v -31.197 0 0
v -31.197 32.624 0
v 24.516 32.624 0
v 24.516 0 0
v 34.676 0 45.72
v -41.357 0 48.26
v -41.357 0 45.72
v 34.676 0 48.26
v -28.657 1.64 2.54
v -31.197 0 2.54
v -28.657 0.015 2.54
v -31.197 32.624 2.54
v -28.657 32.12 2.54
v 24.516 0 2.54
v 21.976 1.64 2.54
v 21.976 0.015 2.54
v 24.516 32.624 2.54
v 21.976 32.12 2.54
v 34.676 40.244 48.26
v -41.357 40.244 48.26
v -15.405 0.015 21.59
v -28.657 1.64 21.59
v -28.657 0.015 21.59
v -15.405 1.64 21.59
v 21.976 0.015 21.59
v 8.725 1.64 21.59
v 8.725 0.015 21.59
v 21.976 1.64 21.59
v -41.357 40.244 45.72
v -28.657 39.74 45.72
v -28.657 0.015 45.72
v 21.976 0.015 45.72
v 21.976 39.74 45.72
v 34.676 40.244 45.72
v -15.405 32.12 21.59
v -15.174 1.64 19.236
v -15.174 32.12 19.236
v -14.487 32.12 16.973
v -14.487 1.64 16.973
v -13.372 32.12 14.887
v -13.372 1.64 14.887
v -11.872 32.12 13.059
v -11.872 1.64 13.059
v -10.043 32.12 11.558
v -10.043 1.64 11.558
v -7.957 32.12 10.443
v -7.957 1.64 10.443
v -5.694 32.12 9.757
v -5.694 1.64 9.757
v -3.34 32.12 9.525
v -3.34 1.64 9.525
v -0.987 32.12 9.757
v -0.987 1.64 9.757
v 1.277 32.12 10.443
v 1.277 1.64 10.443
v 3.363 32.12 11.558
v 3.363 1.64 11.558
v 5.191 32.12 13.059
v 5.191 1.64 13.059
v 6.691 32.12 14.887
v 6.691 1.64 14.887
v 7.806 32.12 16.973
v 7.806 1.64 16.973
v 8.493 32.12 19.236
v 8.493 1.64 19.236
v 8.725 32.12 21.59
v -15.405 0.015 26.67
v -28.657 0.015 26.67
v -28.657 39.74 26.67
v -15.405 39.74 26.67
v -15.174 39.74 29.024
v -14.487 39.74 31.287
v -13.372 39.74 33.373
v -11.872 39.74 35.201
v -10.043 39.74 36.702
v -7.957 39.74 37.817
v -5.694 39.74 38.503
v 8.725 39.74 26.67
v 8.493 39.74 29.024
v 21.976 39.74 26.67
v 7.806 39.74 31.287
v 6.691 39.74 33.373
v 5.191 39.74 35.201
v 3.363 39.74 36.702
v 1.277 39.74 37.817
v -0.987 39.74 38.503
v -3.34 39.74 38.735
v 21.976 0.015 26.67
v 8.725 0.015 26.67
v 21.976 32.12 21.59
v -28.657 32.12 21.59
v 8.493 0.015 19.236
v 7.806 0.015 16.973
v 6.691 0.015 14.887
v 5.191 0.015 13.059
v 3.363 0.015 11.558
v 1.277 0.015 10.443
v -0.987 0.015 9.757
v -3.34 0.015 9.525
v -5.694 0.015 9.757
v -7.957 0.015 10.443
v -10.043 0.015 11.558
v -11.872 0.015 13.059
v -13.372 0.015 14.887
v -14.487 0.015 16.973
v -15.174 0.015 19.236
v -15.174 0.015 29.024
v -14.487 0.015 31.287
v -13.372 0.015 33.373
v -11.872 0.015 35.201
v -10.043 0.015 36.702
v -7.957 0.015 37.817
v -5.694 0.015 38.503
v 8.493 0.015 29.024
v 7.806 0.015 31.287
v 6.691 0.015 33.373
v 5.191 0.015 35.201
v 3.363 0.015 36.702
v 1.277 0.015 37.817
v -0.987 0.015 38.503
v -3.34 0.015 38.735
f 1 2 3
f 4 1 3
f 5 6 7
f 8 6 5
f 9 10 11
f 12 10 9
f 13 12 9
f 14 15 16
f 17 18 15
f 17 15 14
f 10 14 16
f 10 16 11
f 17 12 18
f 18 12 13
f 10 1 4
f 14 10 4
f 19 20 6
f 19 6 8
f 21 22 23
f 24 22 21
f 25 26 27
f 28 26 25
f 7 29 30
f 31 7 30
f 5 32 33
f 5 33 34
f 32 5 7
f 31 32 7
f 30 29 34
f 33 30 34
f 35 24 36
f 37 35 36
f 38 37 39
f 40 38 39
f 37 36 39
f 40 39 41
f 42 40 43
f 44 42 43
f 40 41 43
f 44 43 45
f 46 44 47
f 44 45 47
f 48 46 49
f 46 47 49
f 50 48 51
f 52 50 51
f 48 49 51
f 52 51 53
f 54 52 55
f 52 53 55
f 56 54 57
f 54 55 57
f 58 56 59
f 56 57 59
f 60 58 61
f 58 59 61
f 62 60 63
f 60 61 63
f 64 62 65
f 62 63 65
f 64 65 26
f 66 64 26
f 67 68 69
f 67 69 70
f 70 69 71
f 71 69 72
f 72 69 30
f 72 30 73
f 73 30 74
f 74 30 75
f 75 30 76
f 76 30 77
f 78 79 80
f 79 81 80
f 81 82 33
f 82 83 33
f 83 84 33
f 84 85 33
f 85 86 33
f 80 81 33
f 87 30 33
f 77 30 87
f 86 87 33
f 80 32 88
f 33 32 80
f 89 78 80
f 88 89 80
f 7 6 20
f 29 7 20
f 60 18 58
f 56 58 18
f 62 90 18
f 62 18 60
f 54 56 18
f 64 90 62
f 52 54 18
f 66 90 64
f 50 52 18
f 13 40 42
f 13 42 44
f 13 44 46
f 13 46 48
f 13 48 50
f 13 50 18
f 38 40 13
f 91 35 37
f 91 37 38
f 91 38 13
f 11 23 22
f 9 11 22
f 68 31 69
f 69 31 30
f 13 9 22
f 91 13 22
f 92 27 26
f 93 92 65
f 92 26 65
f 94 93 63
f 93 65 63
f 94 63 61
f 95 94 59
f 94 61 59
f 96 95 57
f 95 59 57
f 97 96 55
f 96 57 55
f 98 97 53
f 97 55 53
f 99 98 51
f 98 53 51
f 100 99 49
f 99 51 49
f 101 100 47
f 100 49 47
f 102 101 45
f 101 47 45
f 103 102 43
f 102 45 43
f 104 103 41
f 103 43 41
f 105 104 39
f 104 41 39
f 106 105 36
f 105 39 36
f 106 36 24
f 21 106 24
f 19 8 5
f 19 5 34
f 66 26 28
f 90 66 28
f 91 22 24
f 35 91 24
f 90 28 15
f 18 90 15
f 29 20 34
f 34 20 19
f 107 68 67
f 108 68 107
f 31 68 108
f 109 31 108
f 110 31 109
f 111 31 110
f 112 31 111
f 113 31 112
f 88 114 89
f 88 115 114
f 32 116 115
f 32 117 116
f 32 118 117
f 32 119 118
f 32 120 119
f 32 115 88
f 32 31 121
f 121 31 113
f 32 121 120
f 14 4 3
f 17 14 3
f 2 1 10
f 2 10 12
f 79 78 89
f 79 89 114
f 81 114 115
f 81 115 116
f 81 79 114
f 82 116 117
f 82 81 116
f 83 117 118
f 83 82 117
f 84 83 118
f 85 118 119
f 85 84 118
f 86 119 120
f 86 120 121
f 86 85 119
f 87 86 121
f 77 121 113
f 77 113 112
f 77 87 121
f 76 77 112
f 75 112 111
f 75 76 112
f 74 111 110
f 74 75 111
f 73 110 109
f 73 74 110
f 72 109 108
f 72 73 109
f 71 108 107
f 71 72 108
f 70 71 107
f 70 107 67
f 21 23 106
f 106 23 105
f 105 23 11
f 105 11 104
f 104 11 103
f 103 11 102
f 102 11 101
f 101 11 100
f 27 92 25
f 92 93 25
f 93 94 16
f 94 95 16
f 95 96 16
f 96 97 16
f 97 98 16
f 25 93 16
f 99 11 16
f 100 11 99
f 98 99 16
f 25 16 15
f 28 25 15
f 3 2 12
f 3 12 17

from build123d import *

# Parameters (mm, degrees)
F0_W       = 76.0333575308
F0_H       = 40.2435958385
F1_DEPTH   = 2.54
F2_W       = 50.6333575308
F2_H       = 39.7249350895
F3_DEPTH   = 19.05
F4_R       = 12.065
F5_DEPTH   = 50.8
F1_FACE1_W = 76.0333575308
F1_FACE1_H = 2.54
F8_DEPTH   = 38.1
F9_DEPTH   = 30.48
F10_DEPTH  = 7.62
F11_DEPTH  = 7.62
F12_DEPTH  = 10.16
F13_DEPTH  = 10.16
F14_DEPTH  = 10.16
F15_DEPTH  = 10.16


with BuildPart() as f1:
    # F0 (on Top) → F1 (new body)
    with BuildSketch(Plane.XY):
        with Locations((-3.3403802663, 20.1217979193)):
            Rectangle(F0_W, F0_H)
    extrude(amount=F1_DEPTH)

    # F2 (on face) → F3 (join)
    with BuildSketch(Plane.XY.offset(2.54)):
        with Locations((-3.3403802663, 19.8778254271)):
            Rectangle(F2_W, F2_H)
    extrude(amount=F3_DEPTH)

    # F4 (on face) → F5 (cut)
    with BuildSketch(Plane(origin=(0, 39.7402929718, 0), x_dir=(-1, 0, 0), z_dir=(0, 1, 0))):
        with Locations((3.3403802663, 21.59)):
            Circle(F4_R)
    extrude(amount=-F5_DEPTH, mode=Mode.SUBTRACT)


with BuildPart() as f7_1:
    # F7: instance of F1
    add(f1.part.mirror(Plane.XY.offset(24.13)))


with BuildPart() as f1_1:
    add(f1.part)

    # F1_face1 (on face) + F7_face (on face) + F7_face1 (on face) → F8 (cut)
    with BuildSketch(Plane(origin=(-3.3403802663, 0, 1.27), x_dir=(1, 0, 0), z_dir=(0, -1, 0))):
        Rectangle(F1_FACE1_W, F1_FACE1_H)
    with BuildSketch(Plane(origin=(-3.3403802663, 39.7402929718, 10.6965157334), x_dir=(-1, 0, 0), z_dir=(0, 1, 0))):
        with BuildLine():
            Line((-25.3166787654, -8.1565157334), (25.3166787654, -8.1565157334))
            Line((25.3166787654, -8.1565157334), (25.3166787654, 10.8934842666))
            Line((25.3166787654, 10.8934842666), (12.065, 10.8934842666))
            ThreePointArc((12.065, 10.8934842666), (0, -1.1715157334), (-12.065, 10.8934842666))
            Line((-12.065, 10.8934842666), (-25.3166787654, 10.8934842666))
            Line((-25.3166787654, 10.8934842666), (-25.3166787654, -8.1565157334))
        make_face()
    with BuildSketch(Plane(origin=(-3.3403802663, 39.7402929718, 37.5634842666), x_dir=(-1, 0, 0), z_dir=(0, 1, 0))):
        with BuildLine():
            Line((25.3166787654, 8.1565157334), (-25.3166787654, 8.1565157334))
            Line((-25.3166787654, 8.1565157334), (-25.3166787654, -10.8934842666))
            Line((-25.3166787654, -10.8934842666), (-12.065, -10.8934842666))
            ThreePointArc((-12.065, -10.8934842666), (0, 1.1715157334), (12.065, -10.8934842666))
            Line((12.065, -10.8934842666), (25.3166787654, -10.8934842666))
            Line((25.3166787654, -10.8934842666), (25.3166787654, 8.1565157334))
        make_face()
    extrude(amount=F8_DEPTH, dir=(0, -1, 0), mode=Mode.SUBTRACT)

    # F9 (add): a face of the model
    f9_faces = [f1_1.faces().sort_by_distance(p)[0] for p in [
        (15.3504591164, 1.6402929718, 21.0490157678),
    ]]
    extrude(f9_faces, amount=F9_DEPTH)

    # F10 (cut): a face of the model
    f10_faces = [f7_1.part.faces().sort_by_distance(p)[0] for p in [
        (-3.3403802663, 40.2435958385, 46.99),
    ]]
    extrude(f10_faces, amount=F10_DEPTH, mode=Mode.SUBTRACT)

    # F11 (cut): a face of the model
    f11_faces = [f1_1.faces().sort_by_distance(p)[0] for p in [
        (-3.3403802663, 40.2435958385, 1.27),
    ]]
    extrude(f11_faces, amount=-F11_DEPTH, mode=Mode.SUBTRACT)

    # F12 (cut): a face of the model
    f12_faces = [f1_1.faces().sort_by_distance(p)[0] for p in [
        (-41.3570590317, 16.3117979193, 1.27),
    ]]
    extrude(f12_faces, amount=-F12_DEPTH, mode=Mode.SUBTRACT)

    # F13 (cut): a face of the model
    f13_faces = [f1_1.faces().sort_by_distance(p)[0] for p in [
        (34.6762984991, 16.3117979193, 1.27),
    ]]
    extrude(f13_faces, amount=-F13_DEPTH, mode=Mode.SUBTRACT)

    # F14 (cut): a face of the model
    f14_faces = [f7_1.part.faces().sort_by_distance(p)[0] for p in [
        (34.6762984991, 20.1217979193, 46.99),
    ]]
    extrude(f14_faces, amount=F14_DEPTH, mode=Mode.SUBTRACT)

    # F15 (cut): a face of the model
    f15_faces = [f7_1.part.faces().sort_by_distance(p)[0] for p in [
        (-41.3570590317, 20.1217979193, 46.99),
    ]]
    extrude(f15_faces, amount=F15_DEPTH, mode=Mode.SUBTRACT)


solid = Compound([f7_1.part, f1_1.part])
